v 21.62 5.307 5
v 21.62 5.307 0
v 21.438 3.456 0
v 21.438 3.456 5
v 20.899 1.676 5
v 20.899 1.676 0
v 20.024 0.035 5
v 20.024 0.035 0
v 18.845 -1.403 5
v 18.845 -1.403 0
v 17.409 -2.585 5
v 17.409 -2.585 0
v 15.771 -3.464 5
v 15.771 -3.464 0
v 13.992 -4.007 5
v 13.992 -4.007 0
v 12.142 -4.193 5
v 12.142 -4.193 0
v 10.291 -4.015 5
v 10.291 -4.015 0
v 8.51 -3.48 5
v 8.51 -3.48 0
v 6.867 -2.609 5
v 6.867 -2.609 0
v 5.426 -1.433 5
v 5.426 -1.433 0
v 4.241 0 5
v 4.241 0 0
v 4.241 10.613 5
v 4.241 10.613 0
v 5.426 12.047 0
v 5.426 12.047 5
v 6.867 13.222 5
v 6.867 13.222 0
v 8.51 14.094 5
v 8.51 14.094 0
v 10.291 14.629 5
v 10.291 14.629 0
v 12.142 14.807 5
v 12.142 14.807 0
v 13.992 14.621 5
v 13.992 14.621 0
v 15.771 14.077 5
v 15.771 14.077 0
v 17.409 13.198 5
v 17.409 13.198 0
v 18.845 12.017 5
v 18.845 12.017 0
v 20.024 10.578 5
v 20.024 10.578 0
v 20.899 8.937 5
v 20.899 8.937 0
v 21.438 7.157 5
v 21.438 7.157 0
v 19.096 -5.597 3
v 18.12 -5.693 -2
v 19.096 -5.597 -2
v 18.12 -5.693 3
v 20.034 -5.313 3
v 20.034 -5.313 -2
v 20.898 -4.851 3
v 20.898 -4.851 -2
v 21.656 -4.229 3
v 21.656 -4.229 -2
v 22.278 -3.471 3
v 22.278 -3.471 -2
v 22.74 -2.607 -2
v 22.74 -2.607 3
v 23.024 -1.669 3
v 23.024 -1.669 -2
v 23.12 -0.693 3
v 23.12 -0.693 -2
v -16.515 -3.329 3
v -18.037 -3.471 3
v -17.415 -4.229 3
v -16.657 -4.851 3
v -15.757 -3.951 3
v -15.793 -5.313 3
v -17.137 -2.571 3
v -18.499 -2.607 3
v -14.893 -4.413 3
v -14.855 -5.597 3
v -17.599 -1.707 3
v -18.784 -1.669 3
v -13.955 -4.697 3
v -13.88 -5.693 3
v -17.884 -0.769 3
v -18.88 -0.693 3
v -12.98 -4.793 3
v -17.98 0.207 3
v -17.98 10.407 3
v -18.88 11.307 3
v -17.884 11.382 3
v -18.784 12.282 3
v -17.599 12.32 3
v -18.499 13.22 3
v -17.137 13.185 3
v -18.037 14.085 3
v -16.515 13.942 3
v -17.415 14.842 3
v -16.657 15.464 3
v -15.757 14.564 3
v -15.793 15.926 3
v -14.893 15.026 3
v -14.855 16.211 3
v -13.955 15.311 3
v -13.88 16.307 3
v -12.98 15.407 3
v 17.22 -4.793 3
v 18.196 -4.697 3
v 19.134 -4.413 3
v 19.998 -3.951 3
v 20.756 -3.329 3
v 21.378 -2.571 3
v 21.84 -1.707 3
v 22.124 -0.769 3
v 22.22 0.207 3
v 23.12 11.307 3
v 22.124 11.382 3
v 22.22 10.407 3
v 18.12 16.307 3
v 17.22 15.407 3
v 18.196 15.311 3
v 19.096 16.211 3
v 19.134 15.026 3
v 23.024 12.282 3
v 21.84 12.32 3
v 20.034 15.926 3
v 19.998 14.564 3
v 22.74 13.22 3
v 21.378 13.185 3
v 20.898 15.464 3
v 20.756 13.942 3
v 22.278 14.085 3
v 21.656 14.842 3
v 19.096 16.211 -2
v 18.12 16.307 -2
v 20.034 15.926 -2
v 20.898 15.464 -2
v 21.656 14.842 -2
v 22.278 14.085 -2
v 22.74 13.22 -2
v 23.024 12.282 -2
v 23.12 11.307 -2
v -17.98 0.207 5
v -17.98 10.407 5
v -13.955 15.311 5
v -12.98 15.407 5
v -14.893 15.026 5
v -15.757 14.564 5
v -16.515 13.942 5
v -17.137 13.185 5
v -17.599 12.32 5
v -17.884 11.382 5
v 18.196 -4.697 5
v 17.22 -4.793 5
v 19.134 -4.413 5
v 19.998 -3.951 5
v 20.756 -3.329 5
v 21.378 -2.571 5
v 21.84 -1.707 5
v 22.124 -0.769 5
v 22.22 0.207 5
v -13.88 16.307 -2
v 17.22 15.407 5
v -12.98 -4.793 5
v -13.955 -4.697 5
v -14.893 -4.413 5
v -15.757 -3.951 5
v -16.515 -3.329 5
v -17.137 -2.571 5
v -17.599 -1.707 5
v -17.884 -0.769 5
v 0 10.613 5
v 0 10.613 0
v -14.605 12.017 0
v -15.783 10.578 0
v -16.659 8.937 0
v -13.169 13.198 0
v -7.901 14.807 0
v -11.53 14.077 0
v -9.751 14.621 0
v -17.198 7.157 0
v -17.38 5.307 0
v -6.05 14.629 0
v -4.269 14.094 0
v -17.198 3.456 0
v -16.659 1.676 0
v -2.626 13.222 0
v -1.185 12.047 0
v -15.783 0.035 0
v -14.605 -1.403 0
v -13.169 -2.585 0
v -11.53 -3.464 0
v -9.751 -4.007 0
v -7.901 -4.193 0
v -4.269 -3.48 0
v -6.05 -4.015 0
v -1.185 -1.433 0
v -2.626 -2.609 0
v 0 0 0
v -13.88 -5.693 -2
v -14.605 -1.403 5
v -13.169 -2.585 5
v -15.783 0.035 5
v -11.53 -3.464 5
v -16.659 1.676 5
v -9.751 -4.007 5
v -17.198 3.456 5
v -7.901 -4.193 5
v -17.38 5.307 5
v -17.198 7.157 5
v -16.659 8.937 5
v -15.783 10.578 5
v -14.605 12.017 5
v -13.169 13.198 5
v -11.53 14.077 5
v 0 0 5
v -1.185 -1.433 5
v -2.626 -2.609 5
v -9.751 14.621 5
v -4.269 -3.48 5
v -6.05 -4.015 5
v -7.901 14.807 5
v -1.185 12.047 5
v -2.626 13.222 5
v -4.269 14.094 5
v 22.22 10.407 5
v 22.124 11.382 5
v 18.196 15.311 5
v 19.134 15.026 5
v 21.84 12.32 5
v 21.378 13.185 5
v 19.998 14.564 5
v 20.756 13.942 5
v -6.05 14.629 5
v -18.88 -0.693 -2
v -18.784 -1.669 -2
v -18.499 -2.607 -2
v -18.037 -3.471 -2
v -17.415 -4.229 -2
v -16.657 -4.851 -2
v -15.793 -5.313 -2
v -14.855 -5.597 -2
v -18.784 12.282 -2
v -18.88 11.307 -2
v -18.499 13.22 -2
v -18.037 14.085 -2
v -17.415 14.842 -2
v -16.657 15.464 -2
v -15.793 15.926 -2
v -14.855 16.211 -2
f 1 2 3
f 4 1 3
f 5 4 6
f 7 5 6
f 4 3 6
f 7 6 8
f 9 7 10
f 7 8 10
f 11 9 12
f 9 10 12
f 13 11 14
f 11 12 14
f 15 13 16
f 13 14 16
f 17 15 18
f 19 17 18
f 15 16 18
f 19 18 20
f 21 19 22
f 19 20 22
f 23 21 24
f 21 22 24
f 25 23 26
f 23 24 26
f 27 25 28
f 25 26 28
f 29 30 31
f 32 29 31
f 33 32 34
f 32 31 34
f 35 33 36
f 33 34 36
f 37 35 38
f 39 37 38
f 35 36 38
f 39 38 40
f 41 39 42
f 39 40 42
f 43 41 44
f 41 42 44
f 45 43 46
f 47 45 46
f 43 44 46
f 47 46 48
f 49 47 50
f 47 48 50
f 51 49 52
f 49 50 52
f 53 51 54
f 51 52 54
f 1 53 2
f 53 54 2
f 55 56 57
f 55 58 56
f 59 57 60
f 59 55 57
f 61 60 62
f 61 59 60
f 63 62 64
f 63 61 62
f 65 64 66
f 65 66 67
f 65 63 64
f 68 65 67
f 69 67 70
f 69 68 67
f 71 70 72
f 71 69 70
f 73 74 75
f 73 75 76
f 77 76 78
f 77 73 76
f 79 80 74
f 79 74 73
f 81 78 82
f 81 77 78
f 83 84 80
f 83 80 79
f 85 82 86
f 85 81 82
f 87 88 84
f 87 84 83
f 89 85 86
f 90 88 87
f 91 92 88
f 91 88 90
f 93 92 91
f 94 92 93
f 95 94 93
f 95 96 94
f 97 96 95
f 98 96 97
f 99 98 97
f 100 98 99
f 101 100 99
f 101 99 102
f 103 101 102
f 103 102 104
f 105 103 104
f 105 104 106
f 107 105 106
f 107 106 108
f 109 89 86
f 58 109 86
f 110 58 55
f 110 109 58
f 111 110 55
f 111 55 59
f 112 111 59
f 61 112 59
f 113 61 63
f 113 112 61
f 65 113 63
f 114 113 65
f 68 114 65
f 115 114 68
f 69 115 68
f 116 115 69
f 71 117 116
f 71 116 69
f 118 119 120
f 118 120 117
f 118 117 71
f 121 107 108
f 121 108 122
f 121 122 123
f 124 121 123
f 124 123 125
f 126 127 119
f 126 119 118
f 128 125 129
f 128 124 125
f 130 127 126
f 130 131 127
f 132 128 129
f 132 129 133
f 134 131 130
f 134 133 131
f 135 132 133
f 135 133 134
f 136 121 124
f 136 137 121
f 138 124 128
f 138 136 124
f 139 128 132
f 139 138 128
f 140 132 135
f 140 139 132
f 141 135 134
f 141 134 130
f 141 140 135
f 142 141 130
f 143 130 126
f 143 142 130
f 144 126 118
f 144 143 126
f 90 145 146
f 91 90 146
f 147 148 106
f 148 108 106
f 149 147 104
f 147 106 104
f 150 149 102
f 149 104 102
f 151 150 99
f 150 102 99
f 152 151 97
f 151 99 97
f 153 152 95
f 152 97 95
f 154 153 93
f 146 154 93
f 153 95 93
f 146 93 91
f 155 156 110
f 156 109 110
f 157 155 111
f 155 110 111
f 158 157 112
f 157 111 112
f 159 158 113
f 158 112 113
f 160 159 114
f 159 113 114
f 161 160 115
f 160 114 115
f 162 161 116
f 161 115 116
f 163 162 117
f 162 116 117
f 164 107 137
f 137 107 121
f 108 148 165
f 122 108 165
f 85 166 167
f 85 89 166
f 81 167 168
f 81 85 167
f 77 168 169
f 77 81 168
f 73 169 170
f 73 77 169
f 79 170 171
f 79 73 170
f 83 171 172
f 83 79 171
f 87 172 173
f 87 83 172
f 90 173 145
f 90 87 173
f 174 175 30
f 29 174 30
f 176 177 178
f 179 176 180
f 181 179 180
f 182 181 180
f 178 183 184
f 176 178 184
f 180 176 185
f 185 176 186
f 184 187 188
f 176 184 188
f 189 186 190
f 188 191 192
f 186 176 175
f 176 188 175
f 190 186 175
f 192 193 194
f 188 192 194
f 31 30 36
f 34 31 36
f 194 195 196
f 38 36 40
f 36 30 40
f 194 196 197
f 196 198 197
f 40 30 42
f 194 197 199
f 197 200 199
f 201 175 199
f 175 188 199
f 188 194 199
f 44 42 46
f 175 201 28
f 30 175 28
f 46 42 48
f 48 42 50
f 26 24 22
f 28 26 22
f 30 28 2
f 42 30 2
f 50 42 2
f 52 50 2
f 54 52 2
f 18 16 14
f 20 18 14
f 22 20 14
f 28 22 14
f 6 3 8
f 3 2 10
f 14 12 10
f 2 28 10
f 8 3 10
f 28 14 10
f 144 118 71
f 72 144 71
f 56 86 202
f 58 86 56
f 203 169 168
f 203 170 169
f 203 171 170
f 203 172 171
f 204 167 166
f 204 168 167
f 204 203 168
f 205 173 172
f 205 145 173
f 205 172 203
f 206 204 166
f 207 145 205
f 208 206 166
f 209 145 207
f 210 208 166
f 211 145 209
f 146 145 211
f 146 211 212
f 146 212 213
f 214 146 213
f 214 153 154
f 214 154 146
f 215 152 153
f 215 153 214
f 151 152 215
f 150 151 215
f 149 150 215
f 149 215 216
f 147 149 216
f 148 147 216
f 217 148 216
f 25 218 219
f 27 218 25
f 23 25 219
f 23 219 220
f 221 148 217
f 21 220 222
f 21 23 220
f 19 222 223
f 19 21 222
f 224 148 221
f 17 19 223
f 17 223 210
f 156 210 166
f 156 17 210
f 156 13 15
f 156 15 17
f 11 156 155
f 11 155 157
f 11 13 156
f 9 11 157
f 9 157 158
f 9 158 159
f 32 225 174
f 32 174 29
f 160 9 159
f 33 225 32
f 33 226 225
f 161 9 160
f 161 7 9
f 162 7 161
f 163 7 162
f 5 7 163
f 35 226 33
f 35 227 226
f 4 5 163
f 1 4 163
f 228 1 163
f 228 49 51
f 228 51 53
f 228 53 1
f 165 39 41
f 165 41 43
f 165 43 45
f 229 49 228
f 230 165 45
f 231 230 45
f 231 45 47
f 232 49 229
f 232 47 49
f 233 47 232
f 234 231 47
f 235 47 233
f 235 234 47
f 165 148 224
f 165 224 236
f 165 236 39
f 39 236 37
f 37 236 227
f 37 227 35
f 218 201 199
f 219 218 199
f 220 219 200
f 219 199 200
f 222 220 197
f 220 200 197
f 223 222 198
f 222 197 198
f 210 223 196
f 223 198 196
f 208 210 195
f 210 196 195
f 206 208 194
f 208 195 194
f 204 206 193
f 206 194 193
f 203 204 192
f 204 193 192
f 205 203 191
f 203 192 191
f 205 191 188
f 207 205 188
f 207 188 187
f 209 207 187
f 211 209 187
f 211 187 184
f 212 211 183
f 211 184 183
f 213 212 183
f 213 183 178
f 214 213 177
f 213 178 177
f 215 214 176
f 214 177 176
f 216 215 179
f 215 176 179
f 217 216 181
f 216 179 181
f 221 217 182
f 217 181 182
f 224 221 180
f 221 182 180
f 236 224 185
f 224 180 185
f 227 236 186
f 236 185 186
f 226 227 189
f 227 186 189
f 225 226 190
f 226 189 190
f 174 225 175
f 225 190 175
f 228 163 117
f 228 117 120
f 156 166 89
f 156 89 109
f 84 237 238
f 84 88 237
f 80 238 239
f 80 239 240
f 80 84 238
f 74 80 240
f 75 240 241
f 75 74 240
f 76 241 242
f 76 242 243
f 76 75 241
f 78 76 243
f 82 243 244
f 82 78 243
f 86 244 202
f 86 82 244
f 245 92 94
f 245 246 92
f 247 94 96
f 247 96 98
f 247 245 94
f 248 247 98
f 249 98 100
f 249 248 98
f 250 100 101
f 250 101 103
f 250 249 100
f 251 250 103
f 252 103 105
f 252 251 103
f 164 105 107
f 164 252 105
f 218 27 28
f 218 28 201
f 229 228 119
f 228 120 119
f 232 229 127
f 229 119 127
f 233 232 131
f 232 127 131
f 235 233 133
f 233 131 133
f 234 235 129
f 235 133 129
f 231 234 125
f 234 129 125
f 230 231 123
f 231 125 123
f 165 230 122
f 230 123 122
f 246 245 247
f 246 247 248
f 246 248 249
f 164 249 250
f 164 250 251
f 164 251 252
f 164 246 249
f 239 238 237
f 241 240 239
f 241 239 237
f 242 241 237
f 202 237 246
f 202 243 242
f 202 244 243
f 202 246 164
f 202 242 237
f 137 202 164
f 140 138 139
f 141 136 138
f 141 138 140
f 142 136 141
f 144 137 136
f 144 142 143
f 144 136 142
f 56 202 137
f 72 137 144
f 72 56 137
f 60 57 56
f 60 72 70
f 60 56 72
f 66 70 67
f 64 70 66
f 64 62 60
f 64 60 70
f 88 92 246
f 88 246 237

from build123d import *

# Parameters (mm, degrees)
F0_W     = 42
F0_H     = 22
F1_DEPTH = 5
F2_W     = 42
F2_H     = 22
F3_DEPTH = 2
F4_W     = 42
F4_H     = 22
F4_W_2   = 40.2
F4_H_2   = 20.2
F5_DEPTH = 2
F6_R     = 5


with BuildPart() as f1:
    # F0 (on Top) → F1 (new body)
    with BuildSketch(Plane.XY):
        with Locations((2.120368, 5.306732)):
            Rectangle(F0_W, F0_H)
        with BuildLine():
            ThreePointArc((0, 0), (-17.379632, 5.306732), (0, 10.613464))
            Line((0, 10.613464), (4.240737, 10.613464))
            ThreePointArc((4.240737, 10.613464), (14.89467, 14.392614), (21.620368, 5.306732))
            ThreePointArc((21.620368, 5.306732), (14.89467, -3.77915), (4.240737, 0))
            Line((4.240737, 0), (0, 0))
        make_face(mode=Mode.SUBTRACT)
    extrude(amount=F1_DEPTH)

    # F2 (on face) → F3 (join)
    with BuildSketch(Plane(origin=(0, 0, 0), x_dir=(1, 0, 0), z_dir=(0, 0, -1))):
        with Locations((2.120368, -5.306732)):
            Rectangle(F2_W, F2_H)
    extrude(amount=F3_DEPTH)

    # F4 (on face) → F5 (cut)
    with BuildSketch(Plane.XY.offset(5)):
        with Locations((2.120368, 5.306732)):
            Rectangle(F4_W, F4_H)
        with Locations((2.120368, 5.306732)):
            Rectangle(F4_W_2, F4_H_2, mode=Mode.SUBTRACT)
    extrude(amount=-F5_DEPTH, mode=Mode.SUBTRACT)

    # F6
    f6_edges = [f1.edges().sort_by_distance(p)[0] for p in [
        (-18.879632, 16.306732, 0.5),
        (-18.879632, -5.693268, 0.5),
        (23.120368, -5.693268, 0.5),
        (23.120368, 16.306732, 0.5),
        (22.220368, 15.406732, 4),
        (-17.979632, -4.793268, 4),
        (22.220368, -4.793268, 4),
        (-17.979632, 15.406732, 4),
    ]]
    fillet(f6_edges, radius=F6_R)


solid = f1.part
